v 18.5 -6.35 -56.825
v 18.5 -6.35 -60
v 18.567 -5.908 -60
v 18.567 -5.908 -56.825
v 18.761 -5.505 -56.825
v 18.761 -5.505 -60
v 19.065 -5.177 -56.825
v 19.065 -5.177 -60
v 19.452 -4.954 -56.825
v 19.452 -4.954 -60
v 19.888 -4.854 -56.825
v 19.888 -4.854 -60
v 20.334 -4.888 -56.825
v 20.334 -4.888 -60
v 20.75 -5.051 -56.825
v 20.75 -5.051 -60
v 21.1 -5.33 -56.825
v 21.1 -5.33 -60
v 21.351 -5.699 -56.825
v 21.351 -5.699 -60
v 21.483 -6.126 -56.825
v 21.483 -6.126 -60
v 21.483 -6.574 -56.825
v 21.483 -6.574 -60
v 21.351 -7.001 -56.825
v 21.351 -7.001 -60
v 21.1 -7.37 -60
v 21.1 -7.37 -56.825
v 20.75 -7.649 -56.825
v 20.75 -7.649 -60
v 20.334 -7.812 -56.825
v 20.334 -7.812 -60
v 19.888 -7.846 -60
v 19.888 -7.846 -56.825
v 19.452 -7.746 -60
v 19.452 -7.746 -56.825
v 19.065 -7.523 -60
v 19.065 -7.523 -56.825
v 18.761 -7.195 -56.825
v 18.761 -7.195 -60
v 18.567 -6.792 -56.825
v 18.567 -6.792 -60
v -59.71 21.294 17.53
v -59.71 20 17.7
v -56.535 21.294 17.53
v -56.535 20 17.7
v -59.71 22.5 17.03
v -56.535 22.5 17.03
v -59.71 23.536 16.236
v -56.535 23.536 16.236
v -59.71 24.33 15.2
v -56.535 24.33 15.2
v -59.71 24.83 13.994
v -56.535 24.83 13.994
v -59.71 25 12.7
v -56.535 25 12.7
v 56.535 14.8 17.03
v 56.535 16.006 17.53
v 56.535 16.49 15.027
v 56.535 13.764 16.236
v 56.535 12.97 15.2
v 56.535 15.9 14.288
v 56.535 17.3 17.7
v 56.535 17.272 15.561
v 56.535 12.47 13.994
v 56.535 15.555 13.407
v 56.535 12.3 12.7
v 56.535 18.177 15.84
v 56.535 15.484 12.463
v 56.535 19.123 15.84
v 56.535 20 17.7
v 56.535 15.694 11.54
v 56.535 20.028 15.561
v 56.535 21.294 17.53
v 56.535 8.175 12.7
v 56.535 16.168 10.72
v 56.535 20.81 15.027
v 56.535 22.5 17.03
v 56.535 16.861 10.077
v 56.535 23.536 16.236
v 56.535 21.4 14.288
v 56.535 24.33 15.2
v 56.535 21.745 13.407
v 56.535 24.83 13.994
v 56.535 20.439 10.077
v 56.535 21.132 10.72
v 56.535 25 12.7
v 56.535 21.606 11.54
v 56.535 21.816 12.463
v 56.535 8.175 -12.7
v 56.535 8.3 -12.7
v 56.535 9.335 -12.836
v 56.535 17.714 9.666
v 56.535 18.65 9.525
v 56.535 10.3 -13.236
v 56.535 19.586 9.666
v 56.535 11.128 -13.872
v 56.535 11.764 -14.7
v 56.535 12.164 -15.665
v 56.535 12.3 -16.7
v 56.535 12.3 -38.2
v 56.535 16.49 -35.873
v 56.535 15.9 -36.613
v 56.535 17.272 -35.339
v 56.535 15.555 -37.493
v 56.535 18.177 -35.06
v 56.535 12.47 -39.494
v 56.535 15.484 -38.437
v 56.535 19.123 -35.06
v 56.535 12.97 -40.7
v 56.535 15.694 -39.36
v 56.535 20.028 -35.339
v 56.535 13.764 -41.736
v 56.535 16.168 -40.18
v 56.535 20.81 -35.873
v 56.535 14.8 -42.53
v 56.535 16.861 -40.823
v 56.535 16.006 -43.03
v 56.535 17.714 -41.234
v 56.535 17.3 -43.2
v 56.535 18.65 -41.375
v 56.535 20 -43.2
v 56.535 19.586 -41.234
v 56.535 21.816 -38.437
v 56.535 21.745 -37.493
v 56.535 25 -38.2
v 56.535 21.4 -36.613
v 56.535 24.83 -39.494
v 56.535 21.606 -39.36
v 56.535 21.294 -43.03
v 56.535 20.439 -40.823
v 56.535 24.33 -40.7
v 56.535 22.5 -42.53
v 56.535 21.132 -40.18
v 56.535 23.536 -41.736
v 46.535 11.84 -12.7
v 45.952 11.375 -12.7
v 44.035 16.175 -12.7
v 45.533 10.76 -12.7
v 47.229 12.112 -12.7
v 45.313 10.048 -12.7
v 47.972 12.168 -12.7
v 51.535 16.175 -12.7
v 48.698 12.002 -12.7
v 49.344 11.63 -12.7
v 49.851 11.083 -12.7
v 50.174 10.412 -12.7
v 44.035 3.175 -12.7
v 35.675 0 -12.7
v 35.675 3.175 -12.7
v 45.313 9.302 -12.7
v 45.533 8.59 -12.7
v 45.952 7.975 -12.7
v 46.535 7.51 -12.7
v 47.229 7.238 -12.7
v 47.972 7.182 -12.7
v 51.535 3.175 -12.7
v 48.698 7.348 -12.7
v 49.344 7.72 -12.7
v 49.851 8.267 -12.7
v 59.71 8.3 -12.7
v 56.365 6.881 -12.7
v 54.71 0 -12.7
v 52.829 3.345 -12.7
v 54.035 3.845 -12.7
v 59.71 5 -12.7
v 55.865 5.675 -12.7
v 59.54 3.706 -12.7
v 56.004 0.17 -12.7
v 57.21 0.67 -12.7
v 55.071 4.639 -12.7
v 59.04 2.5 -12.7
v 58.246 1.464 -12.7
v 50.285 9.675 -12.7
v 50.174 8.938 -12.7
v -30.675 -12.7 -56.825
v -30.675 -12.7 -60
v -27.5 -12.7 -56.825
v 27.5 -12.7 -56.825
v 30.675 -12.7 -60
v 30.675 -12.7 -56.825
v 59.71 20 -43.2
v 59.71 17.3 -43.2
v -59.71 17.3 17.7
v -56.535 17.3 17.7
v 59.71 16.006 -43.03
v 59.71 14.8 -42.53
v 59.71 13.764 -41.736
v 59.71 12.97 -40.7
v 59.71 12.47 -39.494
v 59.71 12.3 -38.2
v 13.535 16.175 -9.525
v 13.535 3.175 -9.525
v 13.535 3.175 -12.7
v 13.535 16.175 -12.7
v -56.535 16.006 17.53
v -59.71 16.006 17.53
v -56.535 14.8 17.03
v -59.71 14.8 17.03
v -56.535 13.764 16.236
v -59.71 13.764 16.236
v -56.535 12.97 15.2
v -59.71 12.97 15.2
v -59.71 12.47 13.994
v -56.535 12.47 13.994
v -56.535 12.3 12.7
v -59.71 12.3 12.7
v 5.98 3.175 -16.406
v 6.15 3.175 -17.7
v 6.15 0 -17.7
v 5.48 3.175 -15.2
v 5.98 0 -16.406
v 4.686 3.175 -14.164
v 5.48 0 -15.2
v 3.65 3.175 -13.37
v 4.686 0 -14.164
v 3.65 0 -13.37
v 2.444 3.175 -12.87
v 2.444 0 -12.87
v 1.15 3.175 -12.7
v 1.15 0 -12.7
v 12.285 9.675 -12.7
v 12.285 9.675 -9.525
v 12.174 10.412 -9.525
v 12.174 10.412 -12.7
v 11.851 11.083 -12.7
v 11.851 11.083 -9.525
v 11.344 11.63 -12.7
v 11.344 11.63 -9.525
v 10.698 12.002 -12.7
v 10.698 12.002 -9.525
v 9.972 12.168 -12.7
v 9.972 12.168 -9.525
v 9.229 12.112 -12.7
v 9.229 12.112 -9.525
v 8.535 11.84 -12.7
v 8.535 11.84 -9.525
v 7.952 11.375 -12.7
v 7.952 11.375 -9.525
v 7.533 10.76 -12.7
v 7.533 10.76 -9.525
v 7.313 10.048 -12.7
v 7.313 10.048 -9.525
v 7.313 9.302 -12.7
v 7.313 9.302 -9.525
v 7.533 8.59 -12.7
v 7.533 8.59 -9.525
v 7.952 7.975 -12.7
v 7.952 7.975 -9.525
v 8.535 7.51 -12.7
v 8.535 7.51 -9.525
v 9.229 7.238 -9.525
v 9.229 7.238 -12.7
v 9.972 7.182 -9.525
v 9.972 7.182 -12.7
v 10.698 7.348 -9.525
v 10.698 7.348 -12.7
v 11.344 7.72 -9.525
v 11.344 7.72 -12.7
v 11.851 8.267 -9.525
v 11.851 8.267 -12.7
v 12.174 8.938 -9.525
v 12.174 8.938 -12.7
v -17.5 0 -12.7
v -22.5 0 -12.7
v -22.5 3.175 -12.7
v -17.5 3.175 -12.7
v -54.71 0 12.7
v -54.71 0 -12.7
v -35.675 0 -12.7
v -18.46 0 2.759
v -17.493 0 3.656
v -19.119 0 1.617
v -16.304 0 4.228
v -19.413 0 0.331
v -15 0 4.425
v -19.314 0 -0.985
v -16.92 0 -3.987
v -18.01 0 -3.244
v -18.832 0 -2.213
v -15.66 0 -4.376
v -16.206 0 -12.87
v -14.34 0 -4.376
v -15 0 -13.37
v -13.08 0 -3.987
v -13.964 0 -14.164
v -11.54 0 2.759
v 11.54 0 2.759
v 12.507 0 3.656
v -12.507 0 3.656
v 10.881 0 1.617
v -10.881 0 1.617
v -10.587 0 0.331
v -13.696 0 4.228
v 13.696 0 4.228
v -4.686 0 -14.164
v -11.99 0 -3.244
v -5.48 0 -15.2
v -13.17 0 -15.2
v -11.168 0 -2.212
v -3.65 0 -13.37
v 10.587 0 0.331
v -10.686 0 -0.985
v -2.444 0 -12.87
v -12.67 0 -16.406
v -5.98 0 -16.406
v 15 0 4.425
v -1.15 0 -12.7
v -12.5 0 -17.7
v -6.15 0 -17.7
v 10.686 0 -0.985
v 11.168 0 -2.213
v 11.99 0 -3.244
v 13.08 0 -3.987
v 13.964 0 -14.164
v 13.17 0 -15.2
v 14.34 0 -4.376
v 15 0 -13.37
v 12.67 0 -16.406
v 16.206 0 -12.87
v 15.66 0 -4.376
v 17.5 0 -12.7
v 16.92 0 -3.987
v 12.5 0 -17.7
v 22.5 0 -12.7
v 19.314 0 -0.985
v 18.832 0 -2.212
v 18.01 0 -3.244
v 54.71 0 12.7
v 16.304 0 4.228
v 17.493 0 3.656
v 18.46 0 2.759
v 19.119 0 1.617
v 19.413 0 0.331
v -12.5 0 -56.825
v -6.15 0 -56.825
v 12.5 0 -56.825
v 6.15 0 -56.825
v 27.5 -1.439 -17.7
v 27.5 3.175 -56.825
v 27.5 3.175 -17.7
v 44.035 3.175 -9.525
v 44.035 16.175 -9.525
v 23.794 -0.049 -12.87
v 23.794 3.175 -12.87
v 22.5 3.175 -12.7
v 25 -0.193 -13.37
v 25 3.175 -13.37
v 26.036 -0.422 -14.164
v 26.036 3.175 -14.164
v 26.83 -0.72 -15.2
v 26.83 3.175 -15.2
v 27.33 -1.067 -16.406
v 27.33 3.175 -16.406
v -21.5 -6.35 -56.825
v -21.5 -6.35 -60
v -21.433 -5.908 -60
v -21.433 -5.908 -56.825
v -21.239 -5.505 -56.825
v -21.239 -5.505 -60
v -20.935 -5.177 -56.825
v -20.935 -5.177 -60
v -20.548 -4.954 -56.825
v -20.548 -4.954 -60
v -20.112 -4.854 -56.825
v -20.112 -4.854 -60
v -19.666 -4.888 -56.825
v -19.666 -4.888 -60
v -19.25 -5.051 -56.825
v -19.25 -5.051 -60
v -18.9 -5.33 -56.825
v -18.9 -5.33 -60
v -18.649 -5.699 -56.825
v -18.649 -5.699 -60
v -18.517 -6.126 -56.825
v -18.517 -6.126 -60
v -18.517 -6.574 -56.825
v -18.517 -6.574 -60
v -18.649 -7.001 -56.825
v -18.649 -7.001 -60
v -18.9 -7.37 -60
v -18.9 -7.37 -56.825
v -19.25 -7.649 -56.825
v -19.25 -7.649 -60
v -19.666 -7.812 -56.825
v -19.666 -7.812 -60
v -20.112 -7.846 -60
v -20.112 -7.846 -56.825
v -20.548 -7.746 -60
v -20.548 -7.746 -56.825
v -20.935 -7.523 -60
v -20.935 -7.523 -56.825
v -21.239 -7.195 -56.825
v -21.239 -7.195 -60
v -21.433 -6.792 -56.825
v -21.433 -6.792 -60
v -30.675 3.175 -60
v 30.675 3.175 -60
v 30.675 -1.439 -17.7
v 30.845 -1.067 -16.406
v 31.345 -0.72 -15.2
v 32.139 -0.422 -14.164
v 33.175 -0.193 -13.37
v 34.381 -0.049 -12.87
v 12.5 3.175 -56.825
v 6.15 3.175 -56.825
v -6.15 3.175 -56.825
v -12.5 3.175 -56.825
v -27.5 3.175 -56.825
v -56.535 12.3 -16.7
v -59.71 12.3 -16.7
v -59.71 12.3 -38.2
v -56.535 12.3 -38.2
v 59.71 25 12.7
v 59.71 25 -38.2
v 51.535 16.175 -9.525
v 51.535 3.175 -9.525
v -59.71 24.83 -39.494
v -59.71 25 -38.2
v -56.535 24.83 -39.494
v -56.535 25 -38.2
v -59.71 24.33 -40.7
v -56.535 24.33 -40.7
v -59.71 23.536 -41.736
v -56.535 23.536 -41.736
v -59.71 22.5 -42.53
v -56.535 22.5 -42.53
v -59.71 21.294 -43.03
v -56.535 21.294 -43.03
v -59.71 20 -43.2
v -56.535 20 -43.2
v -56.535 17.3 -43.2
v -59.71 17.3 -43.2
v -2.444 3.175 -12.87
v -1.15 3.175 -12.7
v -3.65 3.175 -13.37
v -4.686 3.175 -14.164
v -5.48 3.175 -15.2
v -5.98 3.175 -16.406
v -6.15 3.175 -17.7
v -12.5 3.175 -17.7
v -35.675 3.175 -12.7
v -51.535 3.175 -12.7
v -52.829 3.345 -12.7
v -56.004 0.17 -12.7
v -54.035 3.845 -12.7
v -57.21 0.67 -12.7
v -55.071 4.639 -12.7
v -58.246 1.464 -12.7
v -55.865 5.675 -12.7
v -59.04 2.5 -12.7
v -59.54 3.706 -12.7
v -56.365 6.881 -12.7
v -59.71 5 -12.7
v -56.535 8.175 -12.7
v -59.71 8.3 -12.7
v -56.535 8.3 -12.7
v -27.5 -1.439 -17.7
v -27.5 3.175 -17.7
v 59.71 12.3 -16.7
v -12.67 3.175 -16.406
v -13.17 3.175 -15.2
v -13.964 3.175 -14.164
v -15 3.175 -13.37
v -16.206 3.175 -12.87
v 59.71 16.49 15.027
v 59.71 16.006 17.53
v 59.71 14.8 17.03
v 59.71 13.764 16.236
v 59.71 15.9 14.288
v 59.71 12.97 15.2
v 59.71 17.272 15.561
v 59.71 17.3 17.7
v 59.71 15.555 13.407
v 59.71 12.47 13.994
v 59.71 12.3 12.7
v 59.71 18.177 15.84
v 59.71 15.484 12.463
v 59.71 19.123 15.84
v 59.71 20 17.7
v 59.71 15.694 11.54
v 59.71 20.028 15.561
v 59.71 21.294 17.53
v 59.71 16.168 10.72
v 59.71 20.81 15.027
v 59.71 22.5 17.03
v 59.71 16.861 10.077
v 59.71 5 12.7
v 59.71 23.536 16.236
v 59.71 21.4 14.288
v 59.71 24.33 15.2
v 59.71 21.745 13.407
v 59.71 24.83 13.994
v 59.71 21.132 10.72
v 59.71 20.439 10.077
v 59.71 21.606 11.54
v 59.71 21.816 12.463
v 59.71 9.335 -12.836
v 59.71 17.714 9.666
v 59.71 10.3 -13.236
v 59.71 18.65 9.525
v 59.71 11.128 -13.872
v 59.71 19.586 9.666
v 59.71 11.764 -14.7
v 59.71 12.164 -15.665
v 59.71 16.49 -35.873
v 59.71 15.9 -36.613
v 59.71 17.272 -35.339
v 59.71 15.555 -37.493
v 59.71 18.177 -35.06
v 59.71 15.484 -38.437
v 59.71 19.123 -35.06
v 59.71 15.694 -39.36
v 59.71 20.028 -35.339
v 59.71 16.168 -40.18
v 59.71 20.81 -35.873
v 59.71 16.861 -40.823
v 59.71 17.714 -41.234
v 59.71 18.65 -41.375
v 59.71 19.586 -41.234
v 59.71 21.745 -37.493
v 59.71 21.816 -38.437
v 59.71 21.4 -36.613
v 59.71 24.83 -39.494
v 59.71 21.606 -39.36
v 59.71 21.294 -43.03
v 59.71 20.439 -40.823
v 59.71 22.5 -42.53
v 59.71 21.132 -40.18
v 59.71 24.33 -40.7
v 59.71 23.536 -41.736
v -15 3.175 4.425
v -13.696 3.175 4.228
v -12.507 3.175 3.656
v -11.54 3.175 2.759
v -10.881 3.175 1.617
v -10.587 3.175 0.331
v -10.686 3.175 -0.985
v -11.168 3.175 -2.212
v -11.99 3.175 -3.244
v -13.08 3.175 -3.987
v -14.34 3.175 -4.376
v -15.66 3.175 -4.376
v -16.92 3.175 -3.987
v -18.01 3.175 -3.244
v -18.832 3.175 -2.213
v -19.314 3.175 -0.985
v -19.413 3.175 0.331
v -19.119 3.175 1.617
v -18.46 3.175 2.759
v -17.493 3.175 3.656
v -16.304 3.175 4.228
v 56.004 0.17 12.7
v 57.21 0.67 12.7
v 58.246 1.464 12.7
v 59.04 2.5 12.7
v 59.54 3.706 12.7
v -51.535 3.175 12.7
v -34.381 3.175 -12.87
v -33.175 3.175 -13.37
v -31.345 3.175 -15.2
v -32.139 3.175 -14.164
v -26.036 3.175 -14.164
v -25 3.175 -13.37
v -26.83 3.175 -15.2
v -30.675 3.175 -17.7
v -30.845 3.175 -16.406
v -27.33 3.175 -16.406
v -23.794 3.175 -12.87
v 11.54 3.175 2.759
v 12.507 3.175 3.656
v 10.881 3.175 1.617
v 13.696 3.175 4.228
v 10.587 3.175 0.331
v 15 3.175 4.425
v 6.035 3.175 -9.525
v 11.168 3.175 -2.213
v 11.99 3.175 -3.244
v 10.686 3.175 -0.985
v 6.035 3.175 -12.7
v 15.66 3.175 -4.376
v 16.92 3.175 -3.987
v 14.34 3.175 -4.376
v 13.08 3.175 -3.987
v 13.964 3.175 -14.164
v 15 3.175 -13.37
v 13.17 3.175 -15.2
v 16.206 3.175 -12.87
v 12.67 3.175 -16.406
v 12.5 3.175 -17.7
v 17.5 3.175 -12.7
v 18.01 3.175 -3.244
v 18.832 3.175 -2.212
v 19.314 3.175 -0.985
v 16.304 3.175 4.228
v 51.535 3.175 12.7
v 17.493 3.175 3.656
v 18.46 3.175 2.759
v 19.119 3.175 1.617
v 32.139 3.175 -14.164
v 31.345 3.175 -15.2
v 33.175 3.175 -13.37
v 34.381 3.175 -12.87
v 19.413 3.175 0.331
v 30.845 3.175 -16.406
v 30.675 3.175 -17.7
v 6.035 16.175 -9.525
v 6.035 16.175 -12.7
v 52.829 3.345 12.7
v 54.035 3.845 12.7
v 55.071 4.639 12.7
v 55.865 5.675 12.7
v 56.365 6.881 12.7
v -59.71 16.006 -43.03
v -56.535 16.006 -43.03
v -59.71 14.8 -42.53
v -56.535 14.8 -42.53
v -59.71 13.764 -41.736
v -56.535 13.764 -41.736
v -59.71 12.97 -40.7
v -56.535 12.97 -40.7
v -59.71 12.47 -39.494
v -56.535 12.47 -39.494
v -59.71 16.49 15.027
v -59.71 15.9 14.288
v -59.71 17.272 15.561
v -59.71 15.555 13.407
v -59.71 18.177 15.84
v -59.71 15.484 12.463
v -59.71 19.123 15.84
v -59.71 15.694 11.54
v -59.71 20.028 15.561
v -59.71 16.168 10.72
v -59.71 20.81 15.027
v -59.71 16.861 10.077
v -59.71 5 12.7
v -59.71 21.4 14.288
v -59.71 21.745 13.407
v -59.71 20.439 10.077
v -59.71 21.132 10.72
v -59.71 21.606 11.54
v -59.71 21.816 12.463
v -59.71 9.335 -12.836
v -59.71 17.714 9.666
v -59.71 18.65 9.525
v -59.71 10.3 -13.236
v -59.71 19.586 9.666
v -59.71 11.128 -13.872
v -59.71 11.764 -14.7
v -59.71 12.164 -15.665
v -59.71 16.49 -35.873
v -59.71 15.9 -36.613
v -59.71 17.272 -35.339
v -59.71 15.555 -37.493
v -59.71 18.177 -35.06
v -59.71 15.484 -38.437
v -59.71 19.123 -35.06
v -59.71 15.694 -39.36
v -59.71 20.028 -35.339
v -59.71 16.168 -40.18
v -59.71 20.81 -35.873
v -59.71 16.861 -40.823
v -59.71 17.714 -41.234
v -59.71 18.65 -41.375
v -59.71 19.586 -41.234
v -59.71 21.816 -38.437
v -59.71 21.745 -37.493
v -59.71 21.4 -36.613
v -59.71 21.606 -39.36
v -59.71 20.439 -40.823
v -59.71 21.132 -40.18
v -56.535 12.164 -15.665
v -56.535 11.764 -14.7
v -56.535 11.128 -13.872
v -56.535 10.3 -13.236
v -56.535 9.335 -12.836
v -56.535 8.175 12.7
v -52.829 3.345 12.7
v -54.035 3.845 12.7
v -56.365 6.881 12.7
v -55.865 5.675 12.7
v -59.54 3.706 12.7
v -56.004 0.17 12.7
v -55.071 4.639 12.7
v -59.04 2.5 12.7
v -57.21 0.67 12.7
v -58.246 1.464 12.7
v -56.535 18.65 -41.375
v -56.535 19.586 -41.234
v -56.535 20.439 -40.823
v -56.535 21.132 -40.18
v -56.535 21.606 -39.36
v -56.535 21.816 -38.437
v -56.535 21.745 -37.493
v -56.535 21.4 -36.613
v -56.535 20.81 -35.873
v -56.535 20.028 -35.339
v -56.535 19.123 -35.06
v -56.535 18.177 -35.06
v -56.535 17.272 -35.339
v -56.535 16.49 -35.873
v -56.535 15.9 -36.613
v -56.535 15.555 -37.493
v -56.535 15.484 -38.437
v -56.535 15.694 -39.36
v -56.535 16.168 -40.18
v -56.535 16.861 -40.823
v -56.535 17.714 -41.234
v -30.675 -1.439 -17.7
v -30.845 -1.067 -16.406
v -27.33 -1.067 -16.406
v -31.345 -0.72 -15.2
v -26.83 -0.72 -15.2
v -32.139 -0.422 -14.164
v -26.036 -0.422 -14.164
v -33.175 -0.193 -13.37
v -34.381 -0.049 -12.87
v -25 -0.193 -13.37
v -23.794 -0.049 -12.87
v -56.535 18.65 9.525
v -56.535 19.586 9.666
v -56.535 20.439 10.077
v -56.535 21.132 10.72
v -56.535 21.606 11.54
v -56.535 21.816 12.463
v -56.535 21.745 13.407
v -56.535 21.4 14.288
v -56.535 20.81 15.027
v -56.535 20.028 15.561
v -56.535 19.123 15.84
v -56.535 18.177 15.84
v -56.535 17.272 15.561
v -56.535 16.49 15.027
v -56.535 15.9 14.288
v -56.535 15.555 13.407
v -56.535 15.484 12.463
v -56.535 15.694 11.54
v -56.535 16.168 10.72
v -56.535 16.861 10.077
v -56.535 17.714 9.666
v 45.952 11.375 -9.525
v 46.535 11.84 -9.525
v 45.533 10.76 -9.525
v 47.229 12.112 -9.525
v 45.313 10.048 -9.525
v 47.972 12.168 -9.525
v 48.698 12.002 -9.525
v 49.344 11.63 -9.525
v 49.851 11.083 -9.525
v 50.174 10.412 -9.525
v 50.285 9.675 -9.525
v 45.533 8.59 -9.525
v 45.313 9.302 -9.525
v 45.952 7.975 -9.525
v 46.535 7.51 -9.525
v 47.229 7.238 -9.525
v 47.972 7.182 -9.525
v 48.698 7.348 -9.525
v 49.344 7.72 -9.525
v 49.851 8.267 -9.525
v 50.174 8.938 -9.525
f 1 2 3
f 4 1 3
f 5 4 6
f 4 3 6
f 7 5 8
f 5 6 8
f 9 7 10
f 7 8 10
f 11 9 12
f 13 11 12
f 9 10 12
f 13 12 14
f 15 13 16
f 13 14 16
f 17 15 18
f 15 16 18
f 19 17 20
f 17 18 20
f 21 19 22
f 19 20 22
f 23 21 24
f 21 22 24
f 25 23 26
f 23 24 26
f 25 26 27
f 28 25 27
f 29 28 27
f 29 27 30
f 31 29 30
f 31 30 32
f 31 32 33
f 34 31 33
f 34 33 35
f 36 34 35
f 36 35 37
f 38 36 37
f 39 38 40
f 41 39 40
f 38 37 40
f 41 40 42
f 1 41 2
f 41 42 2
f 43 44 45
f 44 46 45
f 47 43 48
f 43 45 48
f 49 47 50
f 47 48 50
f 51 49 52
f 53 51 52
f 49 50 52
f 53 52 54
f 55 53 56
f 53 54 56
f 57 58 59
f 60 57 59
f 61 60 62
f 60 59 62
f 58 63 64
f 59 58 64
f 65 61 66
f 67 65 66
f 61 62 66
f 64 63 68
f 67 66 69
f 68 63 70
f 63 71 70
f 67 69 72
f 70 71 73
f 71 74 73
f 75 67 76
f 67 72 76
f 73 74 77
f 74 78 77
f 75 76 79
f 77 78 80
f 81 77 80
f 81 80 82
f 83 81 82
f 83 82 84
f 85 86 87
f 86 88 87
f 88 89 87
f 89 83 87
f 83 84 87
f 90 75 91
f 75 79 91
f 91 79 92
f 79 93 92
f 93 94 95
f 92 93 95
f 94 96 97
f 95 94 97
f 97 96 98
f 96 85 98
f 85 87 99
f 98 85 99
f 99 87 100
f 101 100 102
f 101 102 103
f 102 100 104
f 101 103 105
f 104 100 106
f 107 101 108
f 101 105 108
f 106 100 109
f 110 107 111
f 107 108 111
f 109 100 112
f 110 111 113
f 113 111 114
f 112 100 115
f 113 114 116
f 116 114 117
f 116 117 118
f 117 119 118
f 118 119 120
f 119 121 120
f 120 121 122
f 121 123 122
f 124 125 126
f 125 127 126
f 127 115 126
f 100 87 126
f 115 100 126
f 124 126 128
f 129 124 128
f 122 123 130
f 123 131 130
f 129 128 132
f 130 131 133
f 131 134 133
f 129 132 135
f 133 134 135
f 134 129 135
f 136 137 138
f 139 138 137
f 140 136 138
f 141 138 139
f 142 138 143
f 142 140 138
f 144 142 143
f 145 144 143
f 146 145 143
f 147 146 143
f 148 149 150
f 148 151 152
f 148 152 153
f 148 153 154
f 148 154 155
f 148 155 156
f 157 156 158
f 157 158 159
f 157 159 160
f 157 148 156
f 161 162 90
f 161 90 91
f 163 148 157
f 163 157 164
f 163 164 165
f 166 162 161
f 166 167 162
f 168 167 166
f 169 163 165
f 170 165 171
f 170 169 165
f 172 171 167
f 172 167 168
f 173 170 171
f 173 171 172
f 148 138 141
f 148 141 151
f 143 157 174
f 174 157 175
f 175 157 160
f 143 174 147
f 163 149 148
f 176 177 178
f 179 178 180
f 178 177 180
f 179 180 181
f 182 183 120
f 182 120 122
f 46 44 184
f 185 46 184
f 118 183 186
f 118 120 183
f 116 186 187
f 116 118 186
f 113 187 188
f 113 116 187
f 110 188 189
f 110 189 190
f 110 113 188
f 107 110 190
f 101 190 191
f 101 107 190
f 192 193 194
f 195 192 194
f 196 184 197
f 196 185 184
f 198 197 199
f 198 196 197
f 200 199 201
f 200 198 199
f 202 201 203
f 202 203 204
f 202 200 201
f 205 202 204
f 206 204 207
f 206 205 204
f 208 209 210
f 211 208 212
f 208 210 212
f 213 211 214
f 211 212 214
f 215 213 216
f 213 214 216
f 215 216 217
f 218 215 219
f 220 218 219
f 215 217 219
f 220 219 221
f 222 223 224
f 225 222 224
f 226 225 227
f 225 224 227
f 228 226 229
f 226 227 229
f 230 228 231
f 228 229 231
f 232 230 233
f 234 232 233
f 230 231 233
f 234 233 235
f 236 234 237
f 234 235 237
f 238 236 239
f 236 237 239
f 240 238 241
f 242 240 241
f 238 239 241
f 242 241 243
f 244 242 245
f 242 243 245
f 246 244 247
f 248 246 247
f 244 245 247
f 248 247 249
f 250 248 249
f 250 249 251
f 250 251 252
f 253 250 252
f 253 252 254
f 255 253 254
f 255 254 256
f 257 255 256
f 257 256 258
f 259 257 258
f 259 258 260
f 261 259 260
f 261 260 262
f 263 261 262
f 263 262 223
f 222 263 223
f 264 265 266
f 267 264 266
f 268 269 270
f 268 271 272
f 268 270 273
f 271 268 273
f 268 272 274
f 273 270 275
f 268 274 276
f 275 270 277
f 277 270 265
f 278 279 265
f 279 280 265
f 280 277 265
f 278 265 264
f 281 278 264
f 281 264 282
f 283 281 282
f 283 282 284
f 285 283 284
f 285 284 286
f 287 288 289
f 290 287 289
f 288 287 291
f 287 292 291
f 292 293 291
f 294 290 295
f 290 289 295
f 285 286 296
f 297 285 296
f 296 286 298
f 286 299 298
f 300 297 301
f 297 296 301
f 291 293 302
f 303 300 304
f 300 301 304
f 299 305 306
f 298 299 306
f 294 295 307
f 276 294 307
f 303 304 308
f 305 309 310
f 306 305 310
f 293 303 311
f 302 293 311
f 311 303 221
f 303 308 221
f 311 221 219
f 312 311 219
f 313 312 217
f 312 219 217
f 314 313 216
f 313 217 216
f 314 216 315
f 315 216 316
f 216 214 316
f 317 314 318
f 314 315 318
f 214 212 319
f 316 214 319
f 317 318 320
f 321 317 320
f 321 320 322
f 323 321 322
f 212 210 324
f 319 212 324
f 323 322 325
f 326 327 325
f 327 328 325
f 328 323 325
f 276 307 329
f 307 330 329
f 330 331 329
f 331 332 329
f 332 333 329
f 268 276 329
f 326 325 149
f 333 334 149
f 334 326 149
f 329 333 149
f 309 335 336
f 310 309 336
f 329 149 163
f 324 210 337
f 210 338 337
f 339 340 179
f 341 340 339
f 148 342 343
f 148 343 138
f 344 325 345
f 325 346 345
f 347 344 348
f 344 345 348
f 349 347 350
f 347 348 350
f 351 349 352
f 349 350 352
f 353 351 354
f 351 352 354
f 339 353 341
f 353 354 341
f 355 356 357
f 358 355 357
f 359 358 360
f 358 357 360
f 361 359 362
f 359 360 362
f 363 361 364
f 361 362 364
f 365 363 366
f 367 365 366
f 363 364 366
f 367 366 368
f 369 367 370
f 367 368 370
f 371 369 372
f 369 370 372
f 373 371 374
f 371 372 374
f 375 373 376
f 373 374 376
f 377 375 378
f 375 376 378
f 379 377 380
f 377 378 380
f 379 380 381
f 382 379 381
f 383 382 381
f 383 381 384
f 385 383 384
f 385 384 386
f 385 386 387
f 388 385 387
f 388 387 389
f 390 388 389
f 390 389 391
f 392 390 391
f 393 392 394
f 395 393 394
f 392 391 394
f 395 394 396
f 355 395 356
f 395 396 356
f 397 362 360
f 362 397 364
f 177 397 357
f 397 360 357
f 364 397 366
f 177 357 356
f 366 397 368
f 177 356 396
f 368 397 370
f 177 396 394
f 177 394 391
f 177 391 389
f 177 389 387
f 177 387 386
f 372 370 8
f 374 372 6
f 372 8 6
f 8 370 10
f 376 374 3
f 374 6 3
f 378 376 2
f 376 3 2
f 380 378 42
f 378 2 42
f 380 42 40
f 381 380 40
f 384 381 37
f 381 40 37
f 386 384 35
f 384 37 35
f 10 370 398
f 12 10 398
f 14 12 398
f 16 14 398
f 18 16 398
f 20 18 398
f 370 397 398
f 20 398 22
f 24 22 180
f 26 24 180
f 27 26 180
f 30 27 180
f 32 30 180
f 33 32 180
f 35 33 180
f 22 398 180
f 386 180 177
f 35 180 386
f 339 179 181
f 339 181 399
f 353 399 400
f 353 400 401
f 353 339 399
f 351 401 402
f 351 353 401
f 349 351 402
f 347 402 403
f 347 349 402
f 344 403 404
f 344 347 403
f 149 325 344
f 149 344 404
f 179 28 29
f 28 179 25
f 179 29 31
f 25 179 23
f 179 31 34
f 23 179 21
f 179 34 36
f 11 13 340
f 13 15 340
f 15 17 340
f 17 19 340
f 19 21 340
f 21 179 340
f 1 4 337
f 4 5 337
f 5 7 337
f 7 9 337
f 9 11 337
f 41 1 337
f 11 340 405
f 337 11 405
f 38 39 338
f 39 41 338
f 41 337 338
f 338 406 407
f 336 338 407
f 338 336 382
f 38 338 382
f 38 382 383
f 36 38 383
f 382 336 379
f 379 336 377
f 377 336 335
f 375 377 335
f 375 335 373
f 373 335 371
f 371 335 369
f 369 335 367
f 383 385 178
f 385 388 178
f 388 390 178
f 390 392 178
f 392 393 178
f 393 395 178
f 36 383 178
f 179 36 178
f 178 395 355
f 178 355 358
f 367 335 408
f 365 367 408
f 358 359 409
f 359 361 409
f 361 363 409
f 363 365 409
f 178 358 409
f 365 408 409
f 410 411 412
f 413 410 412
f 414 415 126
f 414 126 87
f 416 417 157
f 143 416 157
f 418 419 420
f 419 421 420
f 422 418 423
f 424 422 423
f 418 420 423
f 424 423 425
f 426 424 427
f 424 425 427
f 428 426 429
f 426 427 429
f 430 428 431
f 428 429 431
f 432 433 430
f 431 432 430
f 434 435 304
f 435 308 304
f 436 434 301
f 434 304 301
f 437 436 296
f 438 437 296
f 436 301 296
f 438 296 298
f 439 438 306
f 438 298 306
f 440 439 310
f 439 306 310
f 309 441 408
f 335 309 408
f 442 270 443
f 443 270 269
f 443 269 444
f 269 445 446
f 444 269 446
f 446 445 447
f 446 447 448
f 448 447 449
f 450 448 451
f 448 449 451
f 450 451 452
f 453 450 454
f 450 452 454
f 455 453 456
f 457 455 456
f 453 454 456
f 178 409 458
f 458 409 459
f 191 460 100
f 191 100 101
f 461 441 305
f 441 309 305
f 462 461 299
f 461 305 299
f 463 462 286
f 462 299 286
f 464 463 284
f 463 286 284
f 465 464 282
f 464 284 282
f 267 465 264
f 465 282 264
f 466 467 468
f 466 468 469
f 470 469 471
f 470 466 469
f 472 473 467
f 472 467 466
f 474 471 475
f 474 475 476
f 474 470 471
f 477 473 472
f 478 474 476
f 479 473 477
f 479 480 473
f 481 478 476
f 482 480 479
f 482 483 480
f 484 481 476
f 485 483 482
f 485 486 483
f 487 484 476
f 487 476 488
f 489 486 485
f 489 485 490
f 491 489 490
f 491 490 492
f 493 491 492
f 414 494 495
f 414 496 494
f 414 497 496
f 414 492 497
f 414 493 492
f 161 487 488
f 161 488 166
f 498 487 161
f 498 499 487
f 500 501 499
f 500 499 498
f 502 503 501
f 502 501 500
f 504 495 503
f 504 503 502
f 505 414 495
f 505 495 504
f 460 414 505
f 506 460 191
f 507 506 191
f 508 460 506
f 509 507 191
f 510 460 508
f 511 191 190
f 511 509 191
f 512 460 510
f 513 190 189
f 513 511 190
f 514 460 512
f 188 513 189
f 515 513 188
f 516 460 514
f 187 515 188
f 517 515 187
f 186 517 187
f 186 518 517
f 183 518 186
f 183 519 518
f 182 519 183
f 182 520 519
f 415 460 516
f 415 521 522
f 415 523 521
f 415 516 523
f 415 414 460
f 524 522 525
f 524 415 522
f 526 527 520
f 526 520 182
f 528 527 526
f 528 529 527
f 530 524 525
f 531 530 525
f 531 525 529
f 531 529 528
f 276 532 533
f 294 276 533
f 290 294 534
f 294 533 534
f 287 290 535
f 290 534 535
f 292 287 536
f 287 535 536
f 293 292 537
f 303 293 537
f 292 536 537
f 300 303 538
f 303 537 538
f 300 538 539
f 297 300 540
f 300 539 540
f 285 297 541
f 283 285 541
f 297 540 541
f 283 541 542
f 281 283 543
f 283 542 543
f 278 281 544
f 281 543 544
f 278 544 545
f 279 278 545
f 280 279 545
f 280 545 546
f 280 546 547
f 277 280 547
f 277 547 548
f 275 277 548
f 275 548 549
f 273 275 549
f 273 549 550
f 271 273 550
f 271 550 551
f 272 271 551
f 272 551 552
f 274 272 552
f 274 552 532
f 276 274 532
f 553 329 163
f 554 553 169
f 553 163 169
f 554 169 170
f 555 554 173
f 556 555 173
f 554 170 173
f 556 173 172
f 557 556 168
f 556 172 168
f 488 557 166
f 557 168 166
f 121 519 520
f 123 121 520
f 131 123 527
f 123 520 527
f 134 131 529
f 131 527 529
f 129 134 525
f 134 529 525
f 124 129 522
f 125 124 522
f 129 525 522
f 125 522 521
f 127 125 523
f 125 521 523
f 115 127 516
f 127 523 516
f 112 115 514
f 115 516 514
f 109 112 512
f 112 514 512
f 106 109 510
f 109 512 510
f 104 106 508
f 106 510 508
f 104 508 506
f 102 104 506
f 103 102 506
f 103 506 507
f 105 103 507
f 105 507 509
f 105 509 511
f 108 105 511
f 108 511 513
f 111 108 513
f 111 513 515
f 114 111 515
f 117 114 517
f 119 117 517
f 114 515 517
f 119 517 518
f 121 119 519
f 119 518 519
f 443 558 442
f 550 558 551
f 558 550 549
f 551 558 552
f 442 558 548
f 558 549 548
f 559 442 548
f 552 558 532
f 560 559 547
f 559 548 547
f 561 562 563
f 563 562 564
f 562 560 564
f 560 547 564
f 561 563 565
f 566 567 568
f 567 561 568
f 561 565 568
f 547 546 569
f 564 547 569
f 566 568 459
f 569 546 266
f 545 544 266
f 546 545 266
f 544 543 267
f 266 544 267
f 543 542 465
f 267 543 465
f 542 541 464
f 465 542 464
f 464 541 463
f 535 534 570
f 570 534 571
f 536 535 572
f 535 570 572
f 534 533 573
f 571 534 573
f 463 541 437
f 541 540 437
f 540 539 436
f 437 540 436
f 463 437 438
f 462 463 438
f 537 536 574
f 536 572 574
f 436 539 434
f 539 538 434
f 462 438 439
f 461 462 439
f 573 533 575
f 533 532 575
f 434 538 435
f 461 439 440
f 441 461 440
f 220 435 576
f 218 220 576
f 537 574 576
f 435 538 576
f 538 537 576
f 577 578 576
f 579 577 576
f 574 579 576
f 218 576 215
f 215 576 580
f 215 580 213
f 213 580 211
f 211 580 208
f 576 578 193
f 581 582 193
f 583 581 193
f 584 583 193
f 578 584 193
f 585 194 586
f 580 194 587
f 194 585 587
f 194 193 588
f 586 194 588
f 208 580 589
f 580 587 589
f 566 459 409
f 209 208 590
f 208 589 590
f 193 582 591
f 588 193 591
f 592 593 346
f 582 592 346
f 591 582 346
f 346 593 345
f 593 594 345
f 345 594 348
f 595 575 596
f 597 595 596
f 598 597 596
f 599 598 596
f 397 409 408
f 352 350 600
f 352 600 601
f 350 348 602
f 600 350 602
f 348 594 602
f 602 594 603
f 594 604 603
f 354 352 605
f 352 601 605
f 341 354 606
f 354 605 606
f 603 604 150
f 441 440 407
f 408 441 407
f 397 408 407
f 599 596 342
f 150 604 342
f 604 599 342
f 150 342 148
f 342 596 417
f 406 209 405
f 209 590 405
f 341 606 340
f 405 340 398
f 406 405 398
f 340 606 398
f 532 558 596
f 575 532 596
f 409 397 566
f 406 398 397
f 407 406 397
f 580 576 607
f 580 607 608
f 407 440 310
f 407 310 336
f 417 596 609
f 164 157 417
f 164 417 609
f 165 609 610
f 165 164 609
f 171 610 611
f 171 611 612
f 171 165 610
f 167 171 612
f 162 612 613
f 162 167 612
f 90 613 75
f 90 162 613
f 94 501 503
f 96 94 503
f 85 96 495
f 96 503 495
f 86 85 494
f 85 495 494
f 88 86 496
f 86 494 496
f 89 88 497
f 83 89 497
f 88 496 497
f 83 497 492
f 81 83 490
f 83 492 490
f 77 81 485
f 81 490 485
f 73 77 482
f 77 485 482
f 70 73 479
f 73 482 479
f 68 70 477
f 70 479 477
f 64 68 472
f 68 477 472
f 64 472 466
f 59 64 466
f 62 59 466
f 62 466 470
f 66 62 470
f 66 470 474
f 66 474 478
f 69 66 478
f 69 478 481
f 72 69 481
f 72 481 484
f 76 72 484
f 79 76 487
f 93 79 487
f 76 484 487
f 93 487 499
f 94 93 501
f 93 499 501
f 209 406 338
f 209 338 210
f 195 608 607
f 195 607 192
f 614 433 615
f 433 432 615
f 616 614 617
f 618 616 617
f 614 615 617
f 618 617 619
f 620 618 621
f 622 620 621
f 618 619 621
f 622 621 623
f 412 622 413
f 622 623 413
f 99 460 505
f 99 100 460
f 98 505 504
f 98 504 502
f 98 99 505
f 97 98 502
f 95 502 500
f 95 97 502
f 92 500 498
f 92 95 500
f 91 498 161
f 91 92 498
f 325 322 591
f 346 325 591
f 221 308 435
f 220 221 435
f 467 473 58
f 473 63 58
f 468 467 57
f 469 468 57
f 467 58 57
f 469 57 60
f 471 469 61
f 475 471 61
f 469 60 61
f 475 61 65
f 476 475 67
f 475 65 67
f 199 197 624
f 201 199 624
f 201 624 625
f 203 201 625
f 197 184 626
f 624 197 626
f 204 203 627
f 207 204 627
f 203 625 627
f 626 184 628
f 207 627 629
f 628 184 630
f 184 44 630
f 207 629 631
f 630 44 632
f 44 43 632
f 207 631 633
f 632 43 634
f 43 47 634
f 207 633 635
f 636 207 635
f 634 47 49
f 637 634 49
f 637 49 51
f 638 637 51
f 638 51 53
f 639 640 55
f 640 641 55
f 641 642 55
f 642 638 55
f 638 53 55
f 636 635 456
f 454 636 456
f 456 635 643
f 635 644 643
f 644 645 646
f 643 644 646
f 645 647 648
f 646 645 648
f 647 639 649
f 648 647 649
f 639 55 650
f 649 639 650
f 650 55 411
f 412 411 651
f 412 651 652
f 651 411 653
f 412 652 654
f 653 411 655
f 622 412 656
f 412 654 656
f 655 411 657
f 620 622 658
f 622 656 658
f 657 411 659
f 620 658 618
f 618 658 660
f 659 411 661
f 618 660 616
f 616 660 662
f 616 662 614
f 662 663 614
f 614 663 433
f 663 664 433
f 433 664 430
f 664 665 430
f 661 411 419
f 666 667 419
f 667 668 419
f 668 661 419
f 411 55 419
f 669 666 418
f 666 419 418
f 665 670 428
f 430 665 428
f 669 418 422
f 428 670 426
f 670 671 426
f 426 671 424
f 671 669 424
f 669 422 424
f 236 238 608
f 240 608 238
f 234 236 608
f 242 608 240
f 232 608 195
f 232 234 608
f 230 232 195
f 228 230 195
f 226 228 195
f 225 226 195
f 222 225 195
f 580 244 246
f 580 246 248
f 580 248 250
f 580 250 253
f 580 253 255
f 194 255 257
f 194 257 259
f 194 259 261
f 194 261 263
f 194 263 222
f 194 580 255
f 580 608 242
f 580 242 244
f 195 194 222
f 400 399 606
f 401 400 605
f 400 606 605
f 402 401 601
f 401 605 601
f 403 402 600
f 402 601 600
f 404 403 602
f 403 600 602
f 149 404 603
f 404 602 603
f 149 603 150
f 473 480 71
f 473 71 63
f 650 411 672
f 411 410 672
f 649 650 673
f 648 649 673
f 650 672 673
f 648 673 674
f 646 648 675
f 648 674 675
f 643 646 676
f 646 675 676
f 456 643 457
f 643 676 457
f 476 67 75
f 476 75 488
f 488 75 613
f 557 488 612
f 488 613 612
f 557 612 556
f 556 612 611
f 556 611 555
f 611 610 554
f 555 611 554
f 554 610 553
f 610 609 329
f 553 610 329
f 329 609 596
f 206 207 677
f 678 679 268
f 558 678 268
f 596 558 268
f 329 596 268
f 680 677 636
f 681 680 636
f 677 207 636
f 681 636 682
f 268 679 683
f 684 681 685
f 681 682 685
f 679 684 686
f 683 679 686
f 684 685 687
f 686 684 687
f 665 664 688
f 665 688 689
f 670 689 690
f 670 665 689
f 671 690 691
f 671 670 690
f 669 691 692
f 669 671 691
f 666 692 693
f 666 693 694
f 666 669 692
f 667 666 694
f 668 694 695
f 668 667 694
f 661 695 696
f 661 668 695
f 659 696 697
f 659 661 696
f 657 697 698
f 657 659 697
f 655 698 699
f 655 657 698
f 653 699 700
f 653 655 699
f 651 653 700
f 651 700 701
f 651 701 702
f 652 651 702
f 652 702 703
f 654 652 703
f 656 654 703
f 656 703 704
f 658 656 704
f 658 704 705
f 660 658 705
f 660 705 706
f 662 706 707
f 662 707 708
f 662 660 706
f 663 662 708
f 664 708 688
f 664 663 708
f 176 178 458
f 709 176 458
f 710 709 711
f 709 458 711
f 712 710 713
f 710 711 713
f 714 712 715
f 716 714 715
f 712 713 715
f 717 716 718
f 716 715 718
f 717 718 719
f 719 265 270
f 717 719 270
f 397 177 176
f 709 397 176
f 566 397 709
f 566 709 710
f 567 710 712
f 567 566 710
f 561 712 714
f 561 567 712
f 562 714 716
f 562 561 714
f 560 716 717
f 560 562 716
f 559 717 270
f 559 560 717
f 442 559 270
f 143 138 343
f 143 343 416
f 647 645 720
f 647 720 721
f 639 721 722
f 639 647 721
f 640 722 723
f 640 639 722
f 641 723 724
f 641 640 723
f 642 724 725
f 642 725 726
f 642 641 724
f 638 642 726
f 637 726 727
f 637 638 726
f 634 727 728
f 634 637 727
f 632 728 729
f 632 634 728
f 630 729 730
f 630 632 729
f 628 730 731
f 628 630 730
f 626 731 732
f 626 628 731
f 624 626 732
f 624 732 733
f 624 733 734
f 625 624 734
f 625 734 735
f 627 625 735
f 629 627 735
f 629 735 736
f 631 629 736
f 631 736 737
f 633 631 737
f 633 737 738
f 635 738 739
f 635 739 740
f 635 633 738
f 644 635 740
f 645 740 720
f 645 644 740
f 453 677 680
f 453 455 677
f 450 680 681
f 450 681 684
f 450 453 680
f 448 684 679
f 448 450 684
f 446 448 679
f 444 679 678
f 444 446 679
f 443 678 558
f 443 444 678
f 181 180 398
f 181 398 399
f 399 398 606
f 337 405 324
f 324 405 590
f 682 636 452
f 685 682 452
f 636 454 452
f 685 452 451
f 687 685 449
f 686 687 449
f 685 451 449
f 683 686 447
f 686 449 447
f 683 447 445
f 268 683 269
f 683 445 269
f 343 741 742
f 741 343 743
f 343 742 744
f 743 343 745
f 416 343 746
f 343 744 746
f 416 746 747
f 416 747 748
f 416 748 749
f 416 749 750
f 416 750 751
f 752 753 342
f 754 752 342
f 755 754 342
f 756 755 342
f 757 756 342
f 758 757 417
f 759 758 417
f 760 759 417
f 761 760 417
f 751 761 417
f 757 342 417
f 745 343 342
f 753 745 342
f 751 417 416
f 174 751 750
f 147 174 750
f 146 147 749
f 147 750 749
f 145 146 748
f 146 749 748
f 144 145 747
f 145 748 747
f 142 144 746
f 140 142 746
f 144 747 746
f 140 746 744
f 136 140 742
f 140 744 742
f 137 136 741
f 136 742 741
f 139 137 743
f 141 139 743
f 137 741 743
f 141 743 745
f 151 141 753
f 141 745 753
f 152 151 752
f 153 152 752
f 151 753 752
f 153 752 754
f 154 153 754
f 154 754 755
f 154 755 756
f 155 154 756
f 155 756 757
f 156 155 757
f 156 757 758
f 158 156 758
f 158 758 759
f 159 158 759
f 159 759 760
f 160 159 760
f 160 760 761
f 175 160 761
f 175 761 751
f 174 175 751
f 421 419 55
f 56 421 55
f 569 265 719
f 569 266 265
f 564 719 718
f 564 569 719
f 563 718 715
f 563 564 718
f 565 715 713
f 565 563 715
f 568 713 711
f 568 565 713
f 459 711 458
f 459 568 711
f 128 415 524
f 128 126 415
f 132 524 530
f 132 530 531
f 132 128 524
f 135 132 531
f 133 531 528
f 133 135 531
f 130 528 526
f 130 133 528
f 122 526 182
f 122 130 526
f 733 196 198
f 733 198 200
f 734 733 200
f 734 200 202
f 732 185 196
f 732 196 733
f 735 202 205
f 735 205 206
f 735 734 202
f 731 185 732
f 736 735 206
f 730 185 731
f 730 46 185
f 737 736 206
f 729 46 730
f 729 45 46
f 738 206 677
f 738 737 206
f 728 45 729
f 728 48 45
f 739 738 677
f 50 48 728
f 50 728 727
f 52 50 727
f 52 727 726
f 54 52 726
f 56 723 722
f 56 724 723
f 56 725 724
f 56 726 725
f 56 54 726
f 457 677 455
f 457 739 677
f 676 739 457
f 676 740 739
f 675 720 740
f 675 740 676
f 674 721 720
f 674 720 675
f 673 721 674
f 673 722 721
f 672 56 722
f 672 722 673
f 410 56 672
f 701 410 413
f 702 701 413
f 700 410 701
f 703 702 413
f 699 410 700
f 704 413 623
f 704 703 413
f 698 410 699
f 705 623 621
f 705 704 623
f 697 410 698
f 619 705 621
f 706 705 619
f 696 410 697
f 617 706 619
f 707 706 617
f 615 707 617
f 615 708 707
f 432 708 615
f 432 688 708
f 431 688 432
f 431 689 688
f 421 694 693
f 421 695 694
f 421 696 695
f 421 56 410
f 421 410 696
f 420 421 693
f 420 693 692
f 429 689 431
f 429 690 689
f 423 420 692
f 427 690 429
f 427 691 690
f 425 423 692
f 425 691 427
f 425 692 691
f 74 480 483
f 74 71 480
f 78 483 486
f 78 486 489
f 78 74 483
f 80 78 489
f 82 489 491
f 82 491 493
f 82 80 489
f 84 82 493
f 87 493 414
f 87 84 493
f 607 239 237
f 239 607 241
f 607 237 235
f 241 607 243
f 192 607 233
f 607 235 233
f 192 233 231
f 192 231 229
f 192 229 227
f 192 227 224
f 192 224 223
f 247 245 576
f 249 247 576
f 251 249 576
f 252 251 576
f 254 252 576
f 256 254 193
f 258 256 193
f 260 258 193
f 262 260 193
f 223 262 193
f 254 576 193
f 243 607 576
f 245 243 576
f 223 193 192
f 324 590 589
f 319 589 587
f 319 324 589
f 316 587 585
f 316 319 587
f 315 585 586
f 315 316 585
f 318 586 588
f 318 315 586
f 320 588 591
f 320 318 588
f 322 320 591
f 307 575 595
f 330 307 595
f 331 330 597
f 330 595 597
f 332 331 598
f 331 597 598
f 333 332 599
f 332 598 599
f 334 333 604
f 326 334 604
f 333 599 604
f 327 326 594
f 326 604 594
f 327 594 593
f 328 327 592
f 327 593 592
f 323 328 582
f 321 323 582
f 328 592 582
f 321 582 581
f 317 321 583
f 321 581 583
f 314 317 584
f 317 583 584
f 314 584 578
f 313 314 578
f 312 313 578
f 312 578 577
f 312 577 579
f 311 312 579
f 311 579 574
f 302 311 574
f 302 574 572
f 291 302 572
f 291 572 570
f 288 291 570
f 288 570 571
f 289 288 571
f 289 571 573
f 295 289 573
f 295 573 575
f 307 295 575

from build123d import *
from OCP.BRepFilletAPI import BRepFilletAPI_MakeFillet

# Parameters (mm, degrees)
SKETCH1_W              = 119.42
SKETCH1_H              = 25.4
BOSS_EXTRUDE1_DEPTH    = 3.175
SKETCH2_R              = 3.175
SKETCH2_W              = 25.4
SKETCH2_H              = 3.175
BOSS_EXTRUDE3_DEPTH    = 3.175
FILLET2_R              = 5
FILLET2_R_2            = 4
FILLET2_OF_MIRROR3_R   = 5
FILLET2_OF_MIRROR3_R_2 = 4
FILLET3_R              = 5
SKETCH3_R              = 4.425
CUT_EXTRUDE1_DEPTH     = 10
BOSS_EXTRUDE4_DEPTH    = 3.175
SKETCH9_W              = 55
SKETCH9_H              = 15.875
SKETCH9_R              = 1.5
BOSS_EXTRUDE7_DEPTH    = 3.175
BOSS_EXTRUDE8_DEPTH    = 3.175
FILLET4_R              = 5
SKETCH11_W             = 7.5
SKETCH11_H             = 3.175
BOSS_EXTRUDE9_DEPTH    = 13
SKETCH12_R             = 2.5
CUT_EXTRUDE2_DEPTH     = 10


with BuildPart() as part:
    # Sketch1 → Boss-Extrude1 (new body)
    with BuildSketch(Plane(origin=(0, 0, 0), x_dir=(1, 0, 0), z_dir=(0, 1, 0))):
        Rectangle(SKETCH1_W, SKETCH1_H)
    extrude(amount=BOSS_EXTRUDE1_DEPTH)

    # Sketch2 → Boss-Extrude3 (add)
    # profile 1 of 2: a face of its own
    with BuildSketch(Plane(origin=(59.71, 0, 0), x_dir=(0, 0, -1), z_dir=(1, 0, 0))):
        Polygon((-12.7, 12.3), (-12.7, 3.175), (12.7, 3.175), (12.7, 12.3), (38.2, 12.3), (43.2, 12.3), (43.2, 25), (38.2, 25), (12.7, 25), (-12.7, 25), (-17.7, 25), (-17.7, 12.3), align=None)
        with Locations((-12.7, 18.65)):
            Circle(SKETCH2_R, mode=Mode.SUBTRACT)
        with Locations((38.2, 18.65)):
            Circle(SKETCH2_R, mode=Mode.SUBTRACT)
    # profile 2 of 2: a face of its own
    with BuildSketch(Plane(origin=(59.71, 0, 0), x_dir=(0, 0, -1), z_dir=(1, 0, 0))):
        with Locations((0, 1.5875)):
            Rectangle(SKETCH2_W, SKETCH2_H)
    boss_extrude3 = extrude(amount=-BOSS_EXTRUDE3_DEPTH)

    # Fillet2
    fillet2_edges_1 = [part.edges().sort_by_distance(p)[0] for p in [
        (58.1225, 25, -43.2),
        (58.1225, 12.3, -43.2),
        (58.1225, 12.3, 17.7),
        (58.1225, 25, 17.7),
    ]]
    fillet2_edges_2 = [part.edges().sort_by_distance(p)[0] for p in [
        (58.1225, 12.3, -12.7),
    ]]
    fillet2 = BRepFilletAPI_MakeFillet(part.part.solid().wrapped)
    for e in fillet2_edges_1:
        fillet2.Add(FILLET2_R - 0.0001, e.wrapped)
    for e in fillet2_edges_2:
        fillet2.Add(FILLET2_R_2 - 0.0001, e.wrapped)
    add(Compound.cast(fillet2.Shape()), mode=Mode.REPLACE)  # a hair under: the kernel refuses the full size

    # Mirror3: Boss-Extrude3 across plane
    add(boss_extrude3.mirror(Plane(origin=(0, 0, 0), x_dir=(0, 0, 1), z_dir=(1, 0, 0))))

    # Fillet2 of Mirror3
    fillet2_of_mirror3_edges_1 = [part.edges().sort_by_distance(p)[0] for p in [
        (-58.1225, 25, -43.2),
        (-58.1225, 12.3, -43.2),
        (-58.1225, 12.3, 17.7),
        (-58.1225, 25, 17.7),
    ]]
    fillet2_of_mirror3_edges_2 = [part.edges().sort_by_distance(p)[0] for p in [
        (-58.1225, 12.3, -12.7),
    ]]
    fillet2_of_mirror3 = BRepFilletAPI_MakeFillet(part.part.solid().wrapped)
    for e in fillet2_of_mirror3_edges_1:
        fillet2_of_mirror3.Add(FILLET2_OF_MIRROR3_R - 0.0001, e.wrapped)
    for e in fillet2_of_mirror3_edges_2:
        fillet2_of_mirror3.Add(FILLET2_OF_MIRROR3_R_2 - 0.0001, e.wrapped)
    add(Compound.cast(fillet2_of_mirror3.Shape()), mode=Mode.REPLACE)  # a hair under: the kernel refuses the full size

    # Fillet3
    fillet3_edges = [part.edges().sort_by_distance(p)[0] for p in [
        (56.535, 3.175, 0),
        (59.71, 0, 0),
        (-59.71, 0, 0),
        (-56.535, 3.175, 0),
    ]]
    fillet(fillet3_edges, radius=FILLET3_R)

    # Sketch3 → Cut-Extrude1 (cut)
    with BuildSketch(Plane(origin=(0, 3.175, 0), x_dir=(1, 0, 0), z_dir=(0, 1, 0))):
        with Locations(Location((-15, 0, 0), (0, 0, 270))):
            Circle(SKETCH3_R)
        with Locations(Location((15, 0, 0), (0, 0, 270))):
            Circle(SKETCH3_R)
    extrude(amount=-CUT_EXTRUDE1_DEPTH, mode=Mode.SUBTRACT)

    # Sketch4 → Boss-Extrude4 (add)
    with BuildSketch(Plane(origin=(0, 3.175, 0), x_dir=(1, 0, 0), z_dir=(0, 1, 0))):
        Polygon((-12.5, 60), (12.5, 60), (12.5, 12.7), (6.15, 12.7), (6.15, 19.05), (6.15, 56.825), (-6.15, 56.825), (-6.15, 22.225), (-6.15, 12.7), (-12.5, 12.7), align=None)
    extrude(amount=-BOSS_EXTRUDE4_DEPTH)

    # Sketch9 → Boss-Extrude7 (add)
    with BuildSketch(Plane(origin=(0, 0, -60), x_dir=(-1, 0, 0), z_dir=(0, 0, -1))):
        with Locations((0, -4.7625)):
            Rectangle(SKETCH9_W, SKETCH9_H)
        with Locations((-20, -6.35)):
            Circle(SKETCH9_R, mode=Mode.SUBTRACT)
        with Locations((20, -6.35)):
            Circle(SKETCH9_R, mode=Mode.SUBTRACT)
    extrude(amount=-BOSS_EXTRUDE7_DEPTH)

    # Sketch10 → Boss-Extrude8 (add)
    with BuildSketch(Plane(origin=(27.5, 0, 0), x_dir=(0, 0, -1), z_dir=(1, 0, 0))):
        Polygon((56.825, -12.7), (12.7, 0), (12.7, 3.175), (60, 3.175), (60, -12.7), align=None)
    boss_extrude8 = extrude(amount=BOSS_EXTRUDE8_DEPTH)

    # Mirror4: Boss-Extrude8 across plane
    add(boss_extrude8.mirror(Plane(origin=(0, 0, 0), x_dir=(0, 0, 1), z_dir=(1, 0, 0))))

    # Fillet4
    fillet4_edges = [part.edges().sort_by_distance(p)[0] for p in [
        (12.5, 1.5875, -12.7),
        (6.15, 1.5875, -12.7),
        (-6.15, 1.5875, -12.7),
        (-12.5, 1.5875, -12.7),
        (27.5, 1.5875, -12.7),
        (30.675, 1.5875, -12.7),
        (-30.675, 1.5875, -12.7),
        (-27.5, 1.5875, -12.7),
    ]]
    fillet(fillet4_edges, radius=FILLET4_R)

    # Sketch11 → Boss-Extrude9 (add)
    with BuildSketch(Plane(origin=(0, 3.175, 0), x_dir=(1, 0, 0), z_dir=(0, 1, 0))):
        with Locations((47.785, 11.1125)):
            Rectangle(SKETCH11_W, SKETCH11_H)
        with Locations((9.785, 11.1125)):
            Rectangle(SKETCH11_W, SKETCH11_H)
    extrude(amount=BOSS_EXTRUDE9_DEPTH)

    # Sketch12 → Cut-Extrude2 (cut)
    with BuildSketch(Plane.XY.offset(-9.525)):
        with Locations((9.785, 9.675)):
            Circle(SKETCH12_R)
        with Locations((47.785, 9.675)):
            Circle(SKETCH12_R)
    extrude(amount=-CUT_EXTRUDE2_DEPTH, mode=Mode.SUBTRACT)


solid = part.part
